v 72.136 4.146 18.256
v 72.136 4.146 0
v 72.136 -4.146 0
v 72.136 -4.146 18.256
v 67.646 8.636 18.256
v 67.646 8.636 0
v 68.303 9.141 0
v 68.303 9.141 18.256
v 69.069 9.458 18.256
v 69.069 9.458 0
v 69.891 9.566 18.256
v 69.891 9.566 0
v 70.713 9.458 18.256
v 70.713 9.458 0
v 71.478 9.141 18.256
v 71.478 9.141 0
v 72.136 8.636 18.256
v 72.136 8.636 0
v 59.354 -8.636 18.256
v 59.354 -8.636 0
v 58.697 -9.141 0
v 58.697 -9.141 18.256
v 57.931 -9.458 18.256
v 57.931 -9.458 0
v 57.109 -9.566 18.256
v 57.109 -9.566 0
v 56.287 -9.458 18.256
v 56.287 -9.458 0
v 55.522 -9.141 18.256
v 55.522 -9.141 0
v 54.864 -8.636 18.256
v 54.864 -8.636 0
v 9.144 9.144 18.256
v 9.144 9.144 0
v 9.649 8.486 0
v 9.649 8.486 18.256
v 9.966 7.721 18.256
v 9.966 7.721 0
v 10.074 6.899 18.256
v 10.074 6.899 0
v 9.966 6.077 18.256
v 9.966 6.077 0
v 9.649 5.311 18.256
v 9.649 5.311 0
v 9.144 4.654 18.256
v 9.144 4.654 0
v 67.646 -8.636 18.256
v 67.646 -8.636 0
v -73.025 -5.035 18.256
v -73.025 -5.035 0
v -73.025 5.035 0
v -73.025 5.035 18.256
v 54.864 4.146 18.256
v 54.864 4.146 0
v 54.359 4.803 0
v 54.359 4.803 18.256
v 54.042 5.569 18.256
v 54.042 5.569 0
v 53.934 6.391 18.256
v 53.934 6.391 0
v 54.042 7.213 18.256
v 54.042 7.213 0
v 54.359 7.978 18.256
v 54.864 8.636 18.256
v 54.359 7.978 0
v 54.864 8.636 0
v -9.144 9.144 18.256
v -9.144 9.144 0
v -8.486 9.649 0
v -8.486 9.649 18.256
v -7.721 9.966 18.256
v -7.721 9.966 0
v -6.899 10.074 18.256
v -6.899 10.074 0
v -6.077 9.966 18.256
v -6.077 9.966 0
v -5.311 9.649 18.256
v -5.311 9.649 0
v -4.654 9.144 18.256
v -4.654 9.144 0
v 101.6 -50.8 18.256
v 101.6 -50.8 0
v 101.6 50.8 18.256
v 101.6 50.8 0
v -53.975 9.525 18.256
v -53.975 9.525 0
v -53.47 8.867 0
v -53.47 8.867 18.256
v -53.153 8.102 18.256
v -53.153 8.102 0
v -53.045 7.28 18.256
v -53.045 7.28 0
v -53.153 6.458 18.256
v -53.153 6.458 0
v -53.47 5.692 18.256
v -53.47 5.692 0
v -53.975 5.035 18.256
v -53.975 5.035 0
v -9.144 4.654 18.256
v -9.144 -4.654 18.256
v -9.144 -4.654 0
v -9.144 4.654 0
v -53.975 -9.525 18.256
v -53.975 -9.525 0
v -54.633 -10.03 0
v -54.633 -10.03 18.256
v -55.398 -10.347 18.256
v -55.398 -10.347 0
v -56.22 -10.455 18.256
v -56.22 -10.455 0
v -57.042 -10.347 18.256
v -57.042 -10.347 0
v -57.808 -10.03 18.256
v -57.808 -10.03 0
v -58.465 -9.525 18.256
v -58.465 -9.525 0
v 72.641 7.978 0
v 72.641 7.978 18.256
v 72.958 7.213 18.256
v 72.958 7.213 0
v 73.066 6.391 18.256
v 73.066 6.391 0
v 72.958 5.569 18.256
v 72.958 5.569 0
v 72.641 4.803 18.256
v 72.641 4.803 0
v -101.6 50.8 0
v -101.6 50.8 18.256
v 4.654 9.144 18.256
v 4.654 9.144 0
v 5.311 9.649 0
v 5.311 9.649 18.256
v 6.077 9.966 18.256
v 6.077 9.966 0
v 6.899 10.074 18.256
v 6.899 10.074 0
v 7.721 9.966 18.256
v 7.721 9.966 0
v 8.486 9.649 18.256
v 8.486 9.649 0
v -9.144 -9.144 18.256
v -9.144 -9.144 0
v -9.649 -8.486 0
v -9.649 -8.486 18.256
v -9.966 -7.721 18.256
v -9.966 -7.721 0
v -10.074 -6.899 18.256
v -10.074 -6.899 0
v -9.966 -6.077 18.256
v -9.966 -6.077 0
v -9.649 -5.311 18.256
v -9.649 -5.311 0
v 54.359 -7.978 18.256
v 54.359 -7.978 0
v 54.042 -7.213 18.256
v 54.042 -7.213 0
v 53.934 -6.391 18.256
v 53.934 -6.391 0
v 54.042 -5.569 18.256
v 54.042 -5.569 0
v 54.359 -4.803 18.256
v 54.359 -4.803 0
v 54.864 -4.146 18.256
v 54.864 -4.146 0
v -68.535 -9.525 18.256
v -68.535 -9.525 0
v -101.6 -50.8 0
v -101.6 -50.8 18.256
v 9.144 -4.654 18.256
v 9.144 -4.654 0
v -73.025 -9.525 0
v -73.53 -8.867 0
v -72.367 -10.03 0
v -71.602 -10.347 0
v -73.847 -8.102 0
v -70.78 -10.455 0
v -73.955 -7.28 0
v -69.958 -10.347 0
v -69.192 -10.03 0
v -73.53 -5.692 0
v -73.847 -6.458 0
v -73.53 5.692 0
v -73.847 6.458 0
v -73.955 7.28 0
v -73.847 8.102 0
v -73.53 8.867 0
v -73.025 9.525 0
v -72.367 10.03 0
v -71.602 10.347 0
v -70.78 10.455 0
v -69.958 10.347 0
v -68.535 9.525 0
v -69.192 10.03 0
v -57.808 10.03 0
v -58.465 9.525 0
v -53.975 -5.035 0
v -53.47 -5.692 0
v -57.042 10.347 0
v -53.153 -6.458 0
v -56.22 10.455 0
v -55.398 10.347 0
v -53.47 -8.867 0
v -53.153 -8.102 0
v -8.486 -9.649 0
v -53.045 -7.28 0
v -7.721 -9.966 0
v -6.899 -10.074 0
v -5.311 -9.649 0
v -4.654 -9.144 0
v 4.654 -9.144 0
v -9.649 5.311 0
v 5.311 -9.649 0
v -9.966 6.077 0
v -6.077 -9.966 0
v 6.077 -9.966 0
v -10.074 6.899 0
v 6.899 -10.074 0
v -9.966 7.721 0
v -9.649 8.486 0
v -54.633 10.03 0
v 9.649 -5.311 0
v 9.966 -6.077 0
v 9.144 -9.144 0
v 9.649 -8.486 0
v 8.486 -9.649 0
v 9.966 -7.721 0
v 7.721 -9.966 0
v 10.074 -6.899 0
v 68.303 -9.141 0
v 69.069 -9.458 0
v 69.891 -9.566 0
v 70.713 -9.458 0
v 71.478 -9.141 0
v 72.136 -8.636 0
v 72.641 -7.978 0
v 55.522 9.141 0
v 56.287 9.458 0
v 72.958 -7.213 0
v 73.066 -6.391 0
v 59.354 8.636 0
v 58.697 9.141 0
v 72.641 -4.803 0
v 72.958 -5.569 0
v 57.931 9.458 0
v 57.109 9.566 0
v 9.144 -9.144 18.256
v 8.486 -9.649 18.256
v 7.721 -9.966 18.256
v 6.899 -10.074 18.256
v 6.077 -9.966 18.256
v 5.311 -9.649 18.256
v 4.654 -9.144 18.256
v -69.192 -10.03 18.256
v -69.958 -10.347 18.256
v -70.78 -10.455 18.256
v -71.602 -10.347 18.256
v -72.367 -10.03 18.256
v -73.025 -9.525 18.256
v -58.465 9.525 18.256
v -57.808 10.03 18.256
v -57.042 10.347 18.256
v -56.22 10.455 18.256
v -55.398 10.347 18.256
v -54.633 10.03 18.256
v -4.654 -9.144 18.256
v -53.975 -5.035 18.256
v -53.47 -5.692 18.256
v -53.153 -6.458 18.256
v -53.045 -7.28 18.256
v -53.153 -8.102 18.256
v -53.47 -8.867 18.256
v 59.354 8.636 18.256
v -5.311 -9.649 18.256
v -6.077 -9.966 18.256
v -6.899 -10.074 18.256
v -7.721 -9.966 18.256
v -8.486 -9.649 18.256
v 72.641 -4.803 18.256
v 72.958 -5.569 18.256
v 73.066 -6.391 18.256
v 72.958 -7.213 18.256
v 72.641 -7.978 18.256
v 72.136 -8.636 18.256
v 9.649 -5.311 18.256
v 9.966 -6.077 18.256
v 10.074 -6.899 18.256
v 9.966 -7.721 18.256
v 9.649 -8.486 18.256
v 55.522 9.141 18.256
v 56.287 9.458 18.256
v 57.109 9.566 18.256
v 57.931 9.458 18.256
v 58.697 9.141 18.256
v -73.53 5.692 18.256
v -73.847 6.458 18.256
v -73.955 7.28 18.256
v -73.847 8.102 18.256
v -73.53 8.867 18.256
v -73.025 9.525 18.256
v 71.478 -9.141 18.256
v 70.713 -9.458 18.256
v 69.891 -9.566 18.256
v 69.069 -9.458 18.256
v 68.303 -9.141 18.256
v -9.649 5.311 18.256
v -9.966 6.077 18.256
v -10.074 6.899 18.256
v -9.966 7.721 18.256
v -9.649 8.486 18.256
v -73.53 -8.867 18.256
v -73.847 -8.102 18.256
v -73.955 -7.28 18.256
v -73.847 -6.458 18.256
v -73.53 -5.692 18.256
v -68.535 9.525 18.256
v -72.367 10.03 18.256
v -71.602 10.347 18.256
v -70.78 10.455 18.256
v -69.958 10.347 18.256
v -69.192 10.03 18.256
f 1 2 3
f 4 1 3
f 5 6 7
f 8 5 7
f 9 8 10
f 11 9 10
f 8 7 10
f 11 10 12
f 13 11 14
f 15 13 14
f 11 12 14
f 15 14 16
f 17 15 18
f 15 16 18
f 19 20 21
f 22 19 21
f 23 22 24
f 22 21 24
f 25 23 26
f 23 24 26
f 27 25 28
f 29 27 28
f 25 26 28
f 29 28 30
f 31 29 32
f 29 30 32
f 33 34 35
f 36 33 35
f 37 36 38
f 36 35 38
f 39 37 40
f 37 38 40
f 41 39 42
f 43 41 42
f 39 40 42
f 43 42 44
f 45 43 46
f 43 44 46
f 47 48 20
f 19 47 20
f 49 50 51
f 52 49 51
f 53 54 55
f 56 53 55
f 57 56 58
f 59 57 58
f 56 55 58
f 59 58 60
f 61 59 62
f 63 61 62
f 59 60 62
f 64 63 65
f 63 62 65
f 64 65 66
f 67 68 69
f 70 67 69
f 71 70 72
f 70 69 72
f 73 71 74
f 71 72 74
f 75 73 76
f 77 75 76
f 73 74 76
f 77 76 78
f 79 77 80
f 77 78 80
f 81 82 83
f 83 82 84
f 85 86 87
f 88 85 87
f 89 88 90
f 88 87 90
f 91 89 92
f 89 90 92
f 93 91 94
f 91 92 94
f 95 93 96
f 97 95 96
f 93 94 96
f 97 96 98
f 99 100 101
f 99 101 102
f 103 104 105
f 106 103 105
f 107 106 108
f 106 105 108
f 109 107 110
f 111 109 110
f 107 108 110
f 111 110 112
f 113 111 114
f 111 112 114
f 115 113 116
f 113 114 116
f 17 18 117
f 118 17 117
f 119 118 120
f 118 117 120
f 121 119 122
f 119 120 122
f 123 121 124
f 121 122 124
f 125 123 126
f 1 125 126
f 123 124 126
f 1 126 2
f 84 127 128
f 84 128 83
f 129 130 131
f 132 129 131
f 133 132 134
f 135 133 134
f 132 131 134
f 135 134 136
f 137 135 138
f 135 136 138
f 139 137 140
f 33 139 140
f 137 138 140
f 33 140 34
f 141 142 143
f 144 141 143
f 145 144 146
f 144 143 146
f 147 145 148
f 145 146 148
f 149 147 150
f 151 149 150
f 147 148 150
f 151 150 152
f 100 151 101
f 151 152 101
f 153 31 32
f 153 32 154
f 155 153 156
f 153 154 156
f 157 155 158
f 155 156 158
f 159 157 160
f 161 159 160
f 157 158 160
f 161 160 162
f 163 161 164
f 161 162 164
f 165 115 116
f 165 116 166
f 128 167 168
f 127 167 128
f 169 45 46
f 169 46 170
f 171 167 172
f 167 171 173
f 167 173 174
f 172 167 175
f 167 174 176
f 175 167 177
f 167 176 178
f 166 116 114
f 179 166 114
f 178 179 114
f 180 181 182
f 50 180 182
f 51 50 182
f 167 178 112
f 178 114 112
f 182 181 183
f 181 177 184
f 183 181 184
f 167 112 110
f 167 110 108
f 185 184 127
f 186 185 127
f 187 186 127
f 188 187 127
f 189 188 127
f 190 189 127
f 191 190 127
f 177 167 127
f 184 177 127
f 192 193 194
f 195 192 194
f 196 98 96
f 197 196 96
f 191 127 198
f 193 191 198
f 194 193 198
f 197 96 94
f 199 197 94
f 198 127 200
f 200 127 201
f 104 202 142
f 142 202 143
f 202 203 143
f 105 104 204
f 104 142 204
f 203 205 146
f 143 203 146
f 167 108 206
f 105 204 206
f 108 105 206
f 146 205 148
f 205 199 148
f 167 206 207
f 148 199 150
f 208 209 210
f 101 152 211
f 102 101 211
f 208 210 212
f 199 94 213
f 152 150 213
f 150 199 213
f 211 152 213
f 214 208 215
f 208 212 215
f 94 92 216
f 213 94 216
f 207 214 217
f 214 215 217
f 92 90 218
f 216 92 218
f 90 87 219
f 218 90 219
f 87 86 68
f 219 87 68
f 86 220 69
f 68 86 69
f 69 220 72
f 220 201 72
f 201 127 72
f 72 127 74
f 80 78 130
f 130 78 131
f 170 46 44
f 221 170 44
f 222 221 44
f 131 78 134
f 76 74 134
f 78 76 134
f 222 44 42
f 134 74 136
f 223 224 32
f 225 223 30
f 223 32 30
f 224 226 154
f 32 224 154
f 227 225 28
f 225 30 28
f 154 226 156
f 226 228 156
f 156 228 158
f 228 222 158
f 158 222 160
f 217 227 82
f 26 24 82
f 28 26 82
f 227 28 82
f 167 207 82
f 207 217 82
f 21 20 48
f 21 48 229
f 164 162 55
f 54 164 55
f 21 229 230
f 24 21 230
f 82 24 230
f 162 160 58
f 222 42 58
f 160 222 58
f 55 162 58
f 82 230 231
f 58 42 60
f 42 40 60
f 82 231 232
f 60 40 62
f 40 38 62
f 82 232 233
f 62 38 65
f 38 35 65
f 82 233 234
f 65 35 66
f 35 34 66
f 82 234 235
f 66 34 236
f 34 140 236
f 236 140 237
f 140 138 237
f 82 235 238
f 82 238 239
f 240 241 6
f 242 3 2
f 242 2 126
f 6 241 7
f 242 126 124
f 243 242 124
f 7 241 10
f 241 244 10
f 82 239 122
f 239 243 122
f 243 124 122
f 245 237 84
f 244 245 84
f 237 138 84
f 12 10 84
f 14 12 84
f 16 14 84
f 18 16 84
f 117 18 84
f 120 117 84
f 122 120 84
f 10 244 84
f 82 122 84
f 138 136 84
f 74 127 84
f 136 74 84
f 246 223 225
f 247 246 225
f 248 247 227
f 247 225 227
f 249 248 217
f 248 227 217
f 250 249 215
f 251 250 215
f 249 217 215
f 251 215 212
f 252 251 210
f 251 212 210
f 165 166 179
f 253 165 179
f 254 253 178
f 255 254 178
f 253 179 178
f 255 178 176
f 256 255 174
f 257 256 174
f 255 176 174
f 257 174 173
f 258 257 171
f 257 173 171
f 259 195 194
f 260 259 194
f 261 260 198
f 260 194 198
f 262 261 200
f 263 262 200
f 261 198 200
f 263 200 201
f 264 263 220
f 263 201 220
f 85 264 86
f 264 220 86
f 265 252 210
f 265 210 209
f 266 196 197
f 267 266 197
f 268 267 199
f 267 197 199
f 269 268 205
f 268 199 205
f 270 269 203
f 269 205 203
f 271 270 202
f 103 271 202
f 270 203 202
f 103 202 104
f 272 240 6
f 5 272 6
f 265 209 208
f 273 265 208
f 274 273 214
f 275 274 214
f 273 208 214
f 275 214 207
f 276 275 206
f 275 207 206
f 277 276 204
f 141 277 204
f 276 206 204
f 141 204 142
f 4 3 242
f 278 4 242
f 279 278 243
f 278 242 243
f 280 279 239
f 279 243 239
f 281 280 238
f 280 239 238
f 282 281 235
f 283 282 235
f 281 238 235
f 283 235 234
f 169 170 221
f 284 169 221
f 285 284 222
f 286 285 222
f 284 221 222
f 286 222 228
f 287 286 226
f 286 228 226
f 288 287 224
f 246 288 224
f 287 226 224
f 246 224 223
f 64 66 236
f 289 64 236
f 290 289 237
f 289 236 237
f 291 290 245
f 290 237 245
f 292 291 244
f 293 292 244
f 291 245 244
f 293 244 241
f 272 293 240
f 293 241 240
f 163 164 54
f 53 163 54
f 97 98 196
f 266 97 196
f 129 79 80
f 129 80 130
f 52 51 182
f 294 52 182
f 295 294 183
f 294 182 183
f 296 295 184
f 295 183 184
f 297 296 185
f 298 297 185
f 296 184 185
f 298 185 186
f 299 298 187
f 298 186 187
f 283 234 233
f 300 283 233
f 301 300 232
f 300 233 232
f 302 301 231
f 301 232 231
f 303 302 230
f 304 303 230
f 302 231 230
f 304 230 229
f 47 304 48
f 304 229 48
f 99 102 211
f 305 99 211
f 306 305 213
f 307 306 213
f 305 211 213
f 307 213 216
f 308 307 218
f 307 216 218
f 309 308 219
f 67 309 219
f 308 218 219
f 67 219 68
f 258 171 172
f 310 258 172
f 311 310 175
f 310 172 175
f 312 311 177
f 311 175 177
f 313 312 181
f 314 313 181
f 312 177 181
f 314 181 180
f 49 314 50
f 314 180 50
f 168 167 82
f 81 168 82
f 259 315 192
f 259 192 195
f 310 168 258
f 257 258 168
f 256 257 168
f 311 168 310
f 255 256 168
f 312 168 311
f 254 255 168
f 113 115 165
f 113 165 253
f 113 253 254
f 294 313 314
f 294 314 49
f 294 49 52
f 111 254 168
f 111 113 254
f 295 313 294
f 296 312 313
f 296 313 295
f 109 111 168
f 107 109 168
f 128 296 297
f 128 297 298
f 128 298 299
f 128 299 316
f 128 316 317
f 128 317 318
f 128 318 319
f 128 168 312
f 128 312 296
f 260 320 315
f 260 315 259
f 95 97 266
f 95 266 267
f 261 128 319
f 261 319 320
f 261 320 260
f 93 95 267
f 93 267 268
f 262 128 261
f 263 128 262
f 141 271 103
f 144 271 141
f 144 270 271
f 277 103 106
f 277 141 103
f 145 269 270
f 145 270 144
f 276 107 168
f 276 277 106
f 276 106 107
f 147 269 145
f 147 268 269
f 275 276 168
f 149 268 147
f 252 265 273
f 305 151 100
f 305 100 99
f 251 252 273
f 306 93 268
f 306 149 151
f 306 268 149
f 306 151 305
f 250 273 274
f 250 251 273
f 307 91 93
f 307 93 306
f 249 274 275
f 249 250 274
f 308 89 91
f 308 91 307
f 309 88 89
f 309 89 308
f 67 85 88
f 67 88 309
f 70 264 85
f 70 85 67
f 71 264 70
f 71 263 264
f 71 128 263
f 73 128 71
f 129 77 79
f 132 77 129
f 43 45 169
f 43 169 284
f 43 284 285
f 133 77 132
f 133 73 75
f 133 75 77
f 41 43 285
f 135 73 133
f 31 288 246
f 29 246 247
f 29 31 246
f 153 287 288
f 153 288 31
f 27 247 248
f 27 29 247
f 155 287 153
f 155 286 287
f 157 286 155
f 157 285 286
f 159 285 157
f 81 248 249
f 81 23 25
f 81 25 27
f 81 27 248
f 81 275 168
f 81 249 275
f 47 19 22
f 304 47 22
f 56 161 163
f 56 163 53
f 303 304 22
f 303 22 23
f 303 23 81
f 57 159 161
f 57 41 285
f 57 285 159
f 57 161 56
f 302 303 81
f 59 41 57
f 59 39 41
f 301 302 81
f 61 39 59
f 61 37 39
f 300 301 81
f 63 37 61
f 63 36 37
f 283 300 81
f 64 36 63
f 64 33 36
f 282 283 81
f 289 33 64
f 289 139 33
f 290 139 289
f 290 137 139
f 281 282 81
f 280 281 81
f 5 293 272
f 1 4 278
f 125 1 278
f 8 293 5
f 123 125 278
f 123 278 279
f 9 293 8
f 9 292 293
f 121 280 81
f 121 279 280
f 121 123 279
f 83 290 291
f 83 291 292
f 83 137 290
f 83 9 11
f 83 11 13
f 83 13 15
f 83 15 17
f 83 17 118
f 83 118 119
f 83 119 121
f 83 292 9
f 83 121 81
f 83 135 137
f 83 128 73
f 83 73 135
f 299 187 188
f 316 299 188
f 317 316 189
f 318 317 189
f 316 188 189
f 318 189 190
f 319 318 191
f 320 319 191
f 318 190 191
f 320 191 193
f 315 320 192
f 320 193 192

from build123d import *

# Parameters (mm, degrees)
SKETCH1_W           = 203.2
SKETCH1_H           = 101.6
BOSS_EXTRUDE1_DEPTH = 18.25625


with BuildPart() as part:
    # Sketch1 → Boss-Extrude1 (new body)
    with BuildSketch(Plane.XY):
        Rectangle(SKETCH1_W, SKETCH1_H)
        with BuildLine():
            ThreePointArc((-68.534871939, -9.525), (-70.77993597, -10.45493597), (-73.025, -9.525))
            ThreePointArc((-73.025, -9.525), (-73.95493597, -7.27993597), (-73.025, -5.034871939))
            Line((-73.025, -5.034871939), (-73.025, 5.034871939))
            ThreePointArc((-73.025, 5.034871939), (-73.95493597, 7.27993597), (-73.025, 9.525))
            ThreePointArc((-73.025, 9.525), (-70.77993597, 10.45493597), (-68.534871939, 9.525))
            Line((-68.534871939, 9.525), (-58.465128061, 9.525))
            ThreePointArc((-58.465128061, 9.525), (-56.22006403, 10.45493597), (-53.975, 9.525))
            ThreePointArc((-53.975, 9.525), (-53.04506403, 7.27993597), (-53.975, 5.034871939))
            Line((-53.975, 5.034871939), (-53.975, -5.034871939))
            ThreePointArc((-53.975, -5.034871939), (-53.04506403, -7.27993597), (-53.975, -9.525))
            ThreePointArc((-53.975, -9.525), (-56.22006403, -10.45493597), (-58.465128061, -9.525))
            Line((-58.465128061, -9.525), (-68.534871939, -9.525))
        make_face(mode=Mode.SUBTRACT)
        with BuildLine():
            ThreePointArc((-4.653871939, -9.144), (-6.89893597, -10.07393597), (-9.144, -9.144))
            ThreePointArc((-9.144, -9.144), (-10.07393597, -6.89893597), (-9.144, -4.653871939))
            Line((-9.144, -4.653871939), (-9.144, 4.653871939))
            ThreePointArc((-9.144, 4.653871939), (-10.07393597, 6.89893597), (-9.144, 9.144))
            ThreePointArc((-9.144, 9.144), (-6.89893597, 10.07393597), (-4.653871939, 9.144))
            Line((-4.653871939, 9.144), (4.653871939, 9.144))
            ThreePointArc((4.653871939, 9.144), (6.89893597, 10.07393597), (9.144, 9.144))
            ThreePointArc((9.144, 9.144), (10.07393597, 6.89893597), (9.144, 4.653871939))
            Line((9.144, 4.653871939), (9.144, -4.653871939))
            ThreePointArc((9.144, -4.653871939), (10.07393597, -6.89893597), (9.144, -9.144))
            ThreePointArc((9.144, -9.144), (6.89893597, -10.07393597), (4.653871939, -9.144))
            Line((4.653871939, -9.144), (-4.653871939, -9.144))
        make_face(mode=Mode.SUBTRACT)
        with BuildLine():
            ThreePointArc((59.354128061, -8.636), (57.10906403, -9.56593597), (54.864, -8.636))
            ThreePointArc((54.864, -8.636), (53.93406403, -6.39093597), (54.864, -4.145871939))
            Line((54.864, -4.145871939), (54.864, 4.145871939))
            ThreePointArc((54.864, 4.145871939), (53.93406403, 6.39093597), (54.864, 8.636))
            ThreePointArc((54.864, 8.636), (57.10906403, 9.56593597), (59.354128061, 8.636))
            Line((59.354128061, 8.636), (67.645871939, 8.636))
            ThreePointArc((67.645871939, 8.636), (69.89093597, 9.56593597), (72.136, 8.636))
            ThreePointArc((72.136, 8.636), (73.06593597, 6.39093597), (72.136, 4.145871939))
            Line((72.136, 4.145871939), (72.136, -4.145871939))
            ThreePointArc((72.136, -4.145871939), (73.06593597, -6.39093597), (72.136, -8.636))
            ThreePointArc((72.136, -8.636), (69.89093597, -9.56593597), (67.645871939, -8.636))
            Line((67.645871939, -8.636), (59.354128061, -8.636))
        make_face(mode=Mode.SUBTRACT)
    extrude(amount=BOSS_EXTRUDE1_DEPTH)


solid = part.part
